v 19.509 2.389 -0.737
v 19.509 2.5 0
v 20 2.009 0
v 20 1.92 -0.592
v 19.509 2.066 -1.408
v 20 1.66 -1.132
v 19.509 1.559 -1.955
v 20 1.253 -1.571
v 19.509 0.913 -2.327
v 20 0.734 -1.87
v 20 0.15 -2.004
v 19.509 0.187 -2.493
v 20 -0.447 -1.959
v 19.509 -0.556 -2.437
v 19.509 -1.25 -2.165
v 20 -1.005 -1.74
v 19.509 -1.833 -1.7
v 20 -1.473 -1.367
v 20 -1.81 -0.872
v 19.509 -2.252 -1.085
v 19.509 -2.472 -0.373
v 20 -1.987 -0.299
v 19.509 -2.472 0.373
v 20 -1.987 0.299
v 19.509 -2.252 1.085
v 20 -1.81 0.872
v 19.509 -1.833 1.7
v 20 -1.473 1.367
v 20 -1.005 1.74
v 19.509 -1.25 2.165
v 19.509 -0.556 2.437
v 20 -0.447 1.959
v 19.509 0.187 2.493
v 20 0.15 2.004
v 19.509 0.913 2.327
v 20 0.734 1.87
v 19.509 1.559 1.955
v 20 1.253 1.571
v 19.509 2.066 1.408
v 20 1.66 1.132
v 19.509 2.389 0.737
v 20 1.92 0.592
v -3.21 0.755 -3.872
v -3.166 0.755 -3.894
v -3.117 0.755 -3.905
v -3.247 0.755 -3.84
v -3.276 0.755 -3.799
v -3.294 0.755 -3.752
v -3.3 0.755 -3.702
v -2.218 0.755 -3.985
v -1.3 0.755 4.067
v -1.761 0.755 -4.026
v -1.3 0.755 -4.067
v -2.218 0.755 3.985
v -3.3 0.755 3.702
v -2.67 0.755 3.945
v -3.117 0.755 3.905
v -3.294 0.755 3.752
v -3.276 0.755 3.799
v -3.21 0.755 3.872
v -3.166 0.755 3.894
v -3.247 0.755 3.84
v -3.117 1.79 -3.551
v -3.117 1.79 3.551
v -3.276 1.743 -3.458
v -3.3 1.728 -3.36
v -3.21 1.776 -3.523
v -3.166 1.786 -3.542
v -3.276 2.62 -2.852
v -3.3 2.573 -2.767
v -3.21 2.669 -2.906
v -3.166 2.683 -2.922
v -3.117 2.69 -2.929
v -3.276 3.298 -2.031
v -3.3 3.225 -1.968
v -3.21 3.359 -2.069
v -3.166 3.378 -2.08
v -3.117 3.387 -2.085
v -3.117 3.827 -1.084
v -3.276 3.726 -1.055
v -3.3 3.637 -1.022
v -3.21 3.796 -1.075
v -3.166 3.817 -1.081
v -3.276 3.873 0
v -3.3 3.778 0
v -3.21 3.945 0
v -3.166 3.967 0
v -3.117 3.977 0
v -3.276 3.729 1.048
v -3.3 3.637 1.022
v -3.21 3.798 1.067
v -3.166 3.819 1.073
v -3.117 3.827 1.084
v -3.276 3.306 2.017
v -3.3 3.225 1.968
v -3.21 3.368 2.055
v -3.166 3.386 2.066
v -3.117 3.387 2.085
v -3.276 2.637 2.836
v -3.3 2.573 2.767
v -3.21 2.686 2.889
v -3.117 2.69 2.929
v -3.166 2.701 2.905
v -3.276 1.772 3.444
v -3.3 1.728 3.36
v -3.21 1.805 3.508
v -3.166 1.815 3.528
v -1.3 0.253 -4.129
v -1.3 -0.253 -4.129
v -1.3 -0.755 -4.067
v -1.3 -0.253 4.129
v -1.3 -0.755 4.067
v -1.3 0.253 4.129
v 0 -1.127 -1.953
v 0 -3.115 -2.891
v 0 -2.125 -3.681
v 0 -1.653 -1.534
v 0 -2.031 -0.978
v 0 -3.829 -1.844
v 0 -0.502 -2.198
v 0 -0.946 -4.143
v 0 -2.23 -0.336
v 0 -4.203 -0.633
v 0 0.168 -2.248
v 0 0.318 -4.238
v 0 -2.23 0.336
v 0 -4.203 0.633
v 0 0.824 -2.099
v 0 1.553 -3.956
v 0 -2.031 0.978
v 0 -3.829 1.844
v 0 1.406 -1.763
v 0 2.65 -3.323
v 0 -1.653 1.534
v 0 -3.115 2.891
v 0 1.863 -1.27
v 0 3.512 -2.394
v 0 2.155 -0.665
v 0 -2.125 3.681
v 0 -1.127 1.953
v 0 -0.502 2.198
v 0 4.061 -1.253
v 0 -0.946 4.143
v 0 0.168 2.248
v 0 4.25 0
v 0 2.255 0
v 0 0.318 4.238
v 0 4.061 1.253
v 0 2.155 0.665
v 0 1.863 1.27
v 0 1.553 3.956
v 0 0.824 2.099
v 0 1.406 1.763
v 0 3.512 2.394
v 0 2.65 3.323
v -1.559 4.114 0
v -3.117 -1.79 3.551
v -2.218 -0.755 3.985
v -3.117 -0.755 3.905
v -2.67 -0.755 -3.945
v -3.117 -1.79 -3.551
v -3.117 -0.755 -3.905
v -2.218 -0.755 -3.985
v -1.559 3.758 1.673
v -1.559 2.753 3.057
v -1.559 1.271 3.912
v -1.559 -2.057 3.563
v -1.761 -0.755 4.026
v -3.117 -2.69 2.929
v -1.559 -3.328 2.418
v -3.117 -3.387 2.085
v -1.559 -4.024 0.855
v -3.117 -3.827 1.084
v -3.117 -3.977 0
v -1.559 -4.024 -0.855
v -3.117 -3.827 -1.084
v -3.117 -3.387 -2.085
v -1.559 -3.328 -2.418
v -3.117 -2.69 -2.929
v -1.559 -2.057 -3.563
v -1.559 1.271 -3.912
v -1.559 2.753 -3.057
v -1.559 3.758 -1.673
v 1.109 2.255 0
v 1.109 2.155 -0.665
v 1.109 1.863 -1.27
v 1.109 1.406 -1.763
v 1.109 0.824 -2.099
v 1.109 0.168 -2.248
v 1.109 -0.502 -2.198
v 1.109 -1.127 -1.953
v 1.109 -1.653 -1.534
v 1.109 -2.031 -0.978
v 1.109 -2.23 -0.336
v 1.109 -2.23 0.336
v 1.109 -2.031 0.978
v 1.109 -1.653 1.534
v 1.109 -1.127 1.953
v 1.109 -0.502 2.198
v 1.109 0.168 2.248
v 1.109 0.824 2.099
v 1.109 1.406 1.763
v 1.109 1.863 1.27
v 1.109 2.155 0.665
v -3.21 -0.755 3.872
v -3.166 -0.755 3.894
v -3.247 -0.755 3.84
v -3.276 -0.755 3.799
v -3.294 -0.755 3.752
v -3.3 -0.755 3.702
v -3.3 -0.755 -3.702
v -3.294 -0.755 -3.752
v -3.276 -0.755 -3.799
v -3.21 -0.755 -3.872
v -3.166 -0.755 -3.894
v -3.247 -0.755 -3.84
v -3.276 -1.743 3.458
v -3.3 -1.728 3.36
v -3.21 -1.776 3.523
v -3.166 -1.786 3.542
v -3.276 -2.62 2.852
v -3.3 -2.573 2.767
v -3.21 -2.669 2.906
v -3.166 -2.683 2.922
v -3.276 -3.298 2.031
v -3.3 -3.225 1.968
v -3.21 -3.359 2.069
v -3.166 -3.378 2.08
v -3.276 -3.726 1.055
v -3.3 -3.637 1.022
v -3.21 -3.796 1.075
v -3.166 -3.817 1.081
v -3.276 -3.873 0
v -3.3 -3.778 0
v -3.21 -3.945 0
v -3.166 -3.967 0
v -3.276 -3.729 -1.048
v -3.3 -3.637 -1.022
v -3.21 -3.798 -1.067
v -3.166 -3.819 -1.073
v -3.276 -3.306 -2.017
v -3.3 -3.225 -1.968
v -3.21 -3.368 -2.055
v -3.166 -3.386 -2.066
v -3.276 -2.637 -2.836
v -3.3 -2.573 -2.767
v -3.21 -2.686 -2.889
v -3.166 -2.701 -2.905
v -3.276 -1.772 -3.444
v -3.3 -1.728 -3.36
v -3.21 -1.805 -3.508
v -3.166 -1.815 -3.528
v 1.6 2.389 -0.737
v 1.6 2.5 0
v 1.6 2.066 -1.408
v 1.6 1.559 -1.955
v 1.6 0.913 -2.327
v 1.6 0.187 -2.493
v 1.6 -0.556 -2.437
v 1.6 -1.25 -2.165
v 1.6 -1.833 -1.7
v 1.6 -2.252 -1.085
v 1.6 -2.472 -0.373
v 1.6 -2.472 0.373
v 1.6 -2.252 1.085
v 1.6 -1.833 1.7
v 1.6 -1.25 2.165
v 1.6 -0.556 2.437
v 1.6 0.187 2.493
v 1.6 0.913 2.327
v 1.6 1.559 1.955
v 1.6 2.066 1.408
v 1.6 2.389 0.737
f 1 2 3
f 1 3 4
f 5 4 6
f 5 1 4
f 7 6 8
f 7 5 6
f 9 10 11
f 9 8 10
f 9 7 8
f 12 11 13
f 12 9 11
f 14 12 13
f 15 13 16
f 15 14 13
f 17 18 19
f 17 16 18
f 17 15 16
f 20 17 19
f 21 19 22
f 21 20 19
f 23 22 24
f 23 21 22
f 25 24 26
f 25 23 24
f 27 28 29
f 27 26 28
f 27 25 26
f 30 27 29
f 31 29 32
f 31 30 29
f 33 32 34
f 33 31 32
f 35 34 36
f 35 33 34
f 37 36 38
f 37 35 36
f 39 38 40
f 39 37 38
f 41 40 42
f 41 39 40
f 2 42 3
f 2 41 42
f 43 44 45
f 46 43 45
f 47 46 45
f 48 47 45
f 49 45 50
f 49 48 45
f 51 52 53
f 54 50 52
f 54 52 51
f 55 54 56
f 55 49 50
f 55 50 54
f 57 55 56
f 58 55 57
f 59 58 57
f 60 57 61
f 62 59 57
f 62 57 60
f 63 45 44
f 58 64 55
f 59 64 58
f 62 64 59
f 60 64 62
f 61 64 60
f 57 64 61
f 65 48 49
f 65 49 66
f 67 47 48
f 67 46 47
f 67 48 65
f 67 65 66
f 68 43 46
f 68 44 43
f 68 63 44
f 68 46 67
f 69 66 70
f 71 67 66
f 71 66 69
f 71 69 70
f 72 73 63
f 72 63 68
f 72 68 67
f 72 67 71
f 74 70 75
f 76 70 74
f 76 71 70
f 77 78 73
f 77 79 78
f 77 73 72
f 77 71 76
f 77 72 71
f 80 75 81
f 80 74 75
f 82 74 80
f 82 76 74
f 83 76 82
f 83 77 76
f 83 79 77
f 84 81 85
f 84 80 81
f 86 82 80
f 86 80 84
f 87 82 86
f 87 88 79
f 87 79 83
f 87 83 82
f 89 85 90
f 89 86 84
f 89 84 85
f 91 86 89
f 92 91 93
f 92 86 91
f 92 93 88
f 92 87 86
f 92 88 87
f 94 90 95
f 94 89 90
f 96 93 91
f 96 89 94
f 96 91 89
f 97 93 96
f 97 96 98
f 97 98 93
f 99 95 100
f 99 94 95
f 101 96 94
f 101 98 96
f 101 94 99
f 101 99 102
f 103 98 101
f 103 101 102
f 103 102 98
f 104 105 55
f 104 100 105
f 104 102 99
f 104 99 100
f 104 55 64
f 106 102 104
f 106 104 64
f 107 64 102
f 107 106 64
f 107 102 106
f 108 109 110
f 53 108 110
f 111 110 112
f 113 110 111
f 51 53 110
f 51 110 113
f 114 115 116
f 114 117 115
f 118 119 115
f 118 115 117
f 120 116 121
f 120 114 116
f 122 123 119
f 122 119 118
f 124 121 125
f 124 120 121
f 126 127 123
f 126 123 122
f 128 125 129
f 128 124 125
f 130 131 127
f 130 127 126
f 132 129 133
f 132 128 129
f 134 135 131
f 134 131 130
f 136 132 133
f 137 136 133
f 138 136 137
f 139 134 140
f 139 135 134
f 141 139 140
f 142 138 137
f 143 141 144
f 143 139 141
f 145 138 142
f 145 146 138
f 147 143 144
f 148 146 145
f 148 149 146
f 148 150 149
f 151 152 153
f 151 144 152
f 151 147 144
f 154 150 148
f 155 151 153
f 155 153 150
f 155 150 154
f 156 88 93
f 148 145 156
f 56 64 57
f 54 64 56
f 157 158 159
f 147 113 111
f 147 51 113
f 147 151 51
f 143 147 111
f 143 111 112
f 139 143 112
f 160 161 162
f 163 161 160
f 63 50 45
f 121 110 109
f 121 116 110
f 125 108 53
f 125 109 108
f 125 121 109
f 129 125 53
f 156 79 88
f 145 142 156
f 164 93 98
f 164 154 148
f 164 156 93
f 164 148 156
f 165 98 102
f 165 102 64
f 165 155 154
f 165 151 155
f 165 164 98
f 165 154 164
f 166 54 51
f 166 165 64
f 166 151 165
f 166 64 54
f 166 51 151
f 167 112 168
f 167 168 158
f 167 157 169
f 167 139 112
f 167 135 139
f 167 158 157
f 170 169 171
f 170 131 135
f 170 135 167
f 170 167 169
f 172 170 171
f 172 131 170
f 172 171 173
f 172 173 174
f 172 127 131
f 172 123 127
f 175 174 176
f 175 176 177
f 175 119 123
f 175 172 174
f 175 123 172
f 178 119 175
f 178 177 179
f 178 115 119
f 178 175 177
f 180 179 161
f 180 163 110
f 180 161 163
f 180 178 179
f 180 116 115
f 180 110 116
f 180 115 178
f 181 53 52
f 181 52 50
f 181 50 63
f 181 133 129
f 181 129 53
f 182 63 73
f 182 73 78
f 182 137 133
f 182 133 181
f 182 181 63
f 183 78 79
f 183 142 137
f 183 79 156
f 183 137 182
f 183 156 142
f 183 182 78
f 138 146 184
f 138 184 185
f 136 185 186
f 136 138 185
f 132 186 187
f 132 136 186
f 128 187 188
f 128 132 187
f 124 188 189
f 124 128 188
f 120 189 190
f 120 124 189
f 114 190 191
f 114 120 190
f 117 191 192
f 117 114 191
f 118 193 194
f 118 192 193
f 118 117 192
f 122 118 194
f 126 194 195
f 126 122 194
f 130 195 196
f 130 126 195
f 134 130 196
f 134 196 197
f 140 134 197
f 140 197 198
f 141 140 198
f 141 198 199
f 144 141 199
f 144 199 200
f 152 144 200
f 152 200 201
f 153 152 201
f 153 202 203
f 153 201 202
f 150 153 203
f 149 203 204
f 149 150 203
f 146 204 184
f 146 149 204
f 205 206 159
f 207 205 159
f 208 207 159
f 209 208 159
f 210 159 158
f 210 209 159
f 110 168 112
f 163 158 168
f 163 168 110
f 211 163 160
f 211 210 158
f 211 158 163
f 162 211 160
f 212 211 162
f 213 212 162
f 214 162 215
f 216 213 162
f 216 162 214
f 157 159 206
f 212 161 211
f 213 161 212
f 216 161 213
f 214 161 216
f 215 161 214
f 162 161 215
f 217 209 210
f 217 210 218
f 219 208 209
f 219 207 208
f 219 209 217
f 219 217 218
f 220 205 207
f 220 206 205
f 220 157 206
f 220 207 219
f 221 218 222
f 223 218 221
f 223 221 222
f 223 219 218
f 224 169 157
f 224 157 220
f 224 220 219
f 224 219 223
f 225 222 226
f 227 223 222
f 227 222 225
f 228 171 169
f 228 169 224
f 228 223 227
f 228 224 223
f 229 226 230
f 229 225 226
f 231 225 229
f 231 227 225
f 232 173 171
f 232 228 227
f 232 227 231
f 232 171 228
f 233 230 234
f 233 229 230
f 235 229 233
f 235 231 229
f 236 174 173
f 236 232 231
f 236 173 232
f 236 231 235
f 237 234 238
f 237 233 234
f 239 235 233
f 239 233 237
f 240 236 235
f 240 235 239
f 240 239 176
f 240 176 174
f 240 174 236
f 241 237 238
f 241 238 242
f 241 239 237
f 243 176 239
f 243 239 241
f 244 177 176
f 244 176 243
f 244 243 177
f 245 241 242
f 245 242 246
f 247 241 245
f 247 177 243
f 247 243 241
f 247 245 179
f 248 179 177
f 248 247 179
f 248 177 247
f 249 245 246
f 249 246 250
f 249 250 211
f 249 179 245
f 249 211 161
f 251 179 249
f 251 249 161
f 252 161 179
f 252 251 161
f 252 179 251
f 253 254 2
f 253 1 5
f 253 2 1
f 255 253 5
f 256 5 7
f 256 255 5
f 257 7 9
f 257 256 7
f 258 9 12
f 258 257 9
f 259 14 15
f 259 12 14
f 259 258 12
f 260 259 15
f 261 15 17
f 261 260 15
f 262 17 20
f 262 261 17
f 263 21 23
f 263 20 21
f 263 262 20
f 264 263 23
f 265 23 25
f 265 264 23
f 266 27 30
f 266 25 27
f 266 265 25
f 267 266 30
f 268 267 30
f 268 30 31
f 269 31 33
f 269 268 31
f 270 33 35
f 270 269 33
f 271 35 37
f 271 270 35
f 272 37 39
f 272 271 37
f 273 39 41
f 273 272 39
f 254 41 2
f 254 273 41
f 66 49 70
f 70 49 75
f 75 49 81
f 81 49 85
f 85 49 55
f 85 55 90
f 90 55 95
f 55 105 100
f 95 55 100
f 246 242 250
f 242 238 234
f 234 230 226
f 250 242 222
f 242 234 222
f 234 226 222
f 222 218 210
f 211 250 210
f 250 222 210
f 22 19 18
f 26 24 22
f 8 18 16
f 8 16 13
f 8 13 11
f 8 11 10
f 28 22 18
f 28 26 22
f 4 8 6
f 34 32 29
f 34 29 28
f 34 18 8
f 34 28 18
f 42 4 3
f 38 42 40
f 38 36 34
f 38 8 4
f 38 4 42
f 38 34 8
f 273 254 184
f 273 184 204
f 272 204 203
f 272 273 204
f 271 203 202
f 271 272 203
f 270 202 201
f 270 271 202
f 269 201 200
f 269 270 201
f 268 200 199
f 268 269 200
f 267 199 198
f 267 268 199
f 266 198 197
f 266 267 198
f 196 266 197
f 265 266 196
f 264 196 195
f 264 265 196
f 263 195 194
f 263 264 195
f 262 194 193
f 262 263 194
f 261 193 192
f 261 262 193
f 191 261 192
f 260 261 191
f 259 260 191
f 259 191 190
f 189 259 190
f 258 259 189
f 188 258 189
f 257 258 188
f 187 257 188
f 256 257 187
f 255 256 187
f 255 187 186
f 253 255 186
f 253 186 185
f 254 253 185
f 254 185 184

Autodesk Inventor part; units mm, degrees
ref_plane "YZ Plane" through (0, 0, 0) normal (1, 0, 0) x (0, 1, 0)
ref_plane "XZ Plane" through (0, 0, 0) normal (0, 1, 0) x (-1, 0, 0)
sketch "Rascunho1" plane through (0, 0, 0) normal (0, 0, 1) x (1, 0, 0)
  line L0 (-3.3, 0) -> (20, 0)
  line L1 (20, 0) -> (20, 2.5)
  line L2 (20, 2.5) -> (1.6, 2.5)
  line L3 (1.6, 2.5) -> (1.1091, 2.2547)
  line L4 (1.1091, 2.2547) -> (0, 2.2547)
  line L5 (0, 2.2547) -> (0, 4.25)
  line L6 (-7.96, 0) -> (24.66, 0) projected
  line L7 (0, -0.85) -> (0, 5.1) projected
  line L8 (-3.3, 0) -> (-3.3, 3.9613)
  line L9 (0, 4.25) -> (-3.3, 3.9613)
  line L10 (1.6, 2.5) -> (0, 2.5) construction
  dimension "d0" = 20
  dimension "d1" = 18.4
  dimension "d2" = 0.4909
  dimension "d3" = 3.3
  dimension "d4" = 5
  dimension "d5" = 4.5095
  dimension "d9" = 8.5
  dimension "d10" = 5
revolve "Corpo" add sketch "Rascunho1" angle 360 about axis through (-3.3, 0, 0) along (1, 0, 0)
sketch "Rascunho2" plane through (-3.3, 0, 0) normal (-1, 0, 0) x (0, 0, 1)
  circle A0 centre (0, 0) radius 4.25 projected
  line L0 (0, 0) -> (0, 3.9613) projected
  line L1 (-4.25, 0.755) -> (4.25, 0.755)
  line L2 (4.25, 0.755) -> (4.25, -0.755)
  line L3 (4.25, -0.755) -> (-4.25, -0.755)
  line L4 (-4.25, -0.755) -> (-4.25, 0.755)
  line L5 (-4.25, 0) -> (4.25, 0) construction
  line L6 (0, 0.755) -> (0, -0.755) construction
  point P0 (0, 0)
  dimension "d11" = 1.51
  dimension "d12" = 8.5
fillet "Raio de arredondamento1" radius 0.2 1 edges at (-3.3, -3.9613, 0)
extrude "Fenda" cut sketch "Rascunho2" against normal blind 2 contours A0 L3 L1 | L2 L3 A0 | A0 L1 L2 | A0 L4 L1 | L3 L4 A0
thread "Rosca" size "M5x0.8" class "6g" standard "ISO Metric profile" length 18.4
chamfer "Chanfrar1" distance 0.4908 distance2 0.4909 1 edges at (20, -2.5, 0) measured on face at (20, 1.2612, -0.6619)
ref_plane "Work Plane1" through (30.1625, 0, 0) normal (0, 0, -1) x (1, 0, 0)
equation "\"d11\" = SBR"
equation "\"d12\" = KOD"
equation "\"d14\" = RR"
equation "\"d19\" = STI"
equation "\"d15\" = GEL"
equation "\"d17\" = -0.5 * SPD + 0.5 * GD"
equation "\"d0\" = NLG"
equation "\"d1\" = GEL"
equation "\"d3\" = KOH"
equation "\"d4\" = GD"
equation "\"d5\" = BDM"
equation "\"d9\" = KOD"
equation "\"d10\" = KEWI"
equation "\"GD\" = NND"
equation "\"NLG\" = 20"
equation "\"GEL\" = 18.4"
equation "\"KOD\" = 8.5"
equation "\"KOH\" = 3.3"
equation "\"GAL\" = 0.61345 * PTC"
equation "\"SPD\" = NND - 1.2269 * PTC"
equation "\"BDM\" = 4.5095"
equation "\"GUL\" = 0.61345 * PTC"
equation "\"RR\" = 0.2"
equation "\"SBR\" = 1.51"
equation "\"STI\" = 2"
equation "\"KEWI\" = 5deg"
equation "\"PTC\" = 0.8"
equation "\"THREADDIA\" = 5"
equation "\"TOA\" = 30deg"
equation "\"NND\" = 5"
equation "\"GD1\" = THREADDIA - 1.2269 * PTC"
properties part number "BS 4183 - M5 x 20" material "Aço, suave"
